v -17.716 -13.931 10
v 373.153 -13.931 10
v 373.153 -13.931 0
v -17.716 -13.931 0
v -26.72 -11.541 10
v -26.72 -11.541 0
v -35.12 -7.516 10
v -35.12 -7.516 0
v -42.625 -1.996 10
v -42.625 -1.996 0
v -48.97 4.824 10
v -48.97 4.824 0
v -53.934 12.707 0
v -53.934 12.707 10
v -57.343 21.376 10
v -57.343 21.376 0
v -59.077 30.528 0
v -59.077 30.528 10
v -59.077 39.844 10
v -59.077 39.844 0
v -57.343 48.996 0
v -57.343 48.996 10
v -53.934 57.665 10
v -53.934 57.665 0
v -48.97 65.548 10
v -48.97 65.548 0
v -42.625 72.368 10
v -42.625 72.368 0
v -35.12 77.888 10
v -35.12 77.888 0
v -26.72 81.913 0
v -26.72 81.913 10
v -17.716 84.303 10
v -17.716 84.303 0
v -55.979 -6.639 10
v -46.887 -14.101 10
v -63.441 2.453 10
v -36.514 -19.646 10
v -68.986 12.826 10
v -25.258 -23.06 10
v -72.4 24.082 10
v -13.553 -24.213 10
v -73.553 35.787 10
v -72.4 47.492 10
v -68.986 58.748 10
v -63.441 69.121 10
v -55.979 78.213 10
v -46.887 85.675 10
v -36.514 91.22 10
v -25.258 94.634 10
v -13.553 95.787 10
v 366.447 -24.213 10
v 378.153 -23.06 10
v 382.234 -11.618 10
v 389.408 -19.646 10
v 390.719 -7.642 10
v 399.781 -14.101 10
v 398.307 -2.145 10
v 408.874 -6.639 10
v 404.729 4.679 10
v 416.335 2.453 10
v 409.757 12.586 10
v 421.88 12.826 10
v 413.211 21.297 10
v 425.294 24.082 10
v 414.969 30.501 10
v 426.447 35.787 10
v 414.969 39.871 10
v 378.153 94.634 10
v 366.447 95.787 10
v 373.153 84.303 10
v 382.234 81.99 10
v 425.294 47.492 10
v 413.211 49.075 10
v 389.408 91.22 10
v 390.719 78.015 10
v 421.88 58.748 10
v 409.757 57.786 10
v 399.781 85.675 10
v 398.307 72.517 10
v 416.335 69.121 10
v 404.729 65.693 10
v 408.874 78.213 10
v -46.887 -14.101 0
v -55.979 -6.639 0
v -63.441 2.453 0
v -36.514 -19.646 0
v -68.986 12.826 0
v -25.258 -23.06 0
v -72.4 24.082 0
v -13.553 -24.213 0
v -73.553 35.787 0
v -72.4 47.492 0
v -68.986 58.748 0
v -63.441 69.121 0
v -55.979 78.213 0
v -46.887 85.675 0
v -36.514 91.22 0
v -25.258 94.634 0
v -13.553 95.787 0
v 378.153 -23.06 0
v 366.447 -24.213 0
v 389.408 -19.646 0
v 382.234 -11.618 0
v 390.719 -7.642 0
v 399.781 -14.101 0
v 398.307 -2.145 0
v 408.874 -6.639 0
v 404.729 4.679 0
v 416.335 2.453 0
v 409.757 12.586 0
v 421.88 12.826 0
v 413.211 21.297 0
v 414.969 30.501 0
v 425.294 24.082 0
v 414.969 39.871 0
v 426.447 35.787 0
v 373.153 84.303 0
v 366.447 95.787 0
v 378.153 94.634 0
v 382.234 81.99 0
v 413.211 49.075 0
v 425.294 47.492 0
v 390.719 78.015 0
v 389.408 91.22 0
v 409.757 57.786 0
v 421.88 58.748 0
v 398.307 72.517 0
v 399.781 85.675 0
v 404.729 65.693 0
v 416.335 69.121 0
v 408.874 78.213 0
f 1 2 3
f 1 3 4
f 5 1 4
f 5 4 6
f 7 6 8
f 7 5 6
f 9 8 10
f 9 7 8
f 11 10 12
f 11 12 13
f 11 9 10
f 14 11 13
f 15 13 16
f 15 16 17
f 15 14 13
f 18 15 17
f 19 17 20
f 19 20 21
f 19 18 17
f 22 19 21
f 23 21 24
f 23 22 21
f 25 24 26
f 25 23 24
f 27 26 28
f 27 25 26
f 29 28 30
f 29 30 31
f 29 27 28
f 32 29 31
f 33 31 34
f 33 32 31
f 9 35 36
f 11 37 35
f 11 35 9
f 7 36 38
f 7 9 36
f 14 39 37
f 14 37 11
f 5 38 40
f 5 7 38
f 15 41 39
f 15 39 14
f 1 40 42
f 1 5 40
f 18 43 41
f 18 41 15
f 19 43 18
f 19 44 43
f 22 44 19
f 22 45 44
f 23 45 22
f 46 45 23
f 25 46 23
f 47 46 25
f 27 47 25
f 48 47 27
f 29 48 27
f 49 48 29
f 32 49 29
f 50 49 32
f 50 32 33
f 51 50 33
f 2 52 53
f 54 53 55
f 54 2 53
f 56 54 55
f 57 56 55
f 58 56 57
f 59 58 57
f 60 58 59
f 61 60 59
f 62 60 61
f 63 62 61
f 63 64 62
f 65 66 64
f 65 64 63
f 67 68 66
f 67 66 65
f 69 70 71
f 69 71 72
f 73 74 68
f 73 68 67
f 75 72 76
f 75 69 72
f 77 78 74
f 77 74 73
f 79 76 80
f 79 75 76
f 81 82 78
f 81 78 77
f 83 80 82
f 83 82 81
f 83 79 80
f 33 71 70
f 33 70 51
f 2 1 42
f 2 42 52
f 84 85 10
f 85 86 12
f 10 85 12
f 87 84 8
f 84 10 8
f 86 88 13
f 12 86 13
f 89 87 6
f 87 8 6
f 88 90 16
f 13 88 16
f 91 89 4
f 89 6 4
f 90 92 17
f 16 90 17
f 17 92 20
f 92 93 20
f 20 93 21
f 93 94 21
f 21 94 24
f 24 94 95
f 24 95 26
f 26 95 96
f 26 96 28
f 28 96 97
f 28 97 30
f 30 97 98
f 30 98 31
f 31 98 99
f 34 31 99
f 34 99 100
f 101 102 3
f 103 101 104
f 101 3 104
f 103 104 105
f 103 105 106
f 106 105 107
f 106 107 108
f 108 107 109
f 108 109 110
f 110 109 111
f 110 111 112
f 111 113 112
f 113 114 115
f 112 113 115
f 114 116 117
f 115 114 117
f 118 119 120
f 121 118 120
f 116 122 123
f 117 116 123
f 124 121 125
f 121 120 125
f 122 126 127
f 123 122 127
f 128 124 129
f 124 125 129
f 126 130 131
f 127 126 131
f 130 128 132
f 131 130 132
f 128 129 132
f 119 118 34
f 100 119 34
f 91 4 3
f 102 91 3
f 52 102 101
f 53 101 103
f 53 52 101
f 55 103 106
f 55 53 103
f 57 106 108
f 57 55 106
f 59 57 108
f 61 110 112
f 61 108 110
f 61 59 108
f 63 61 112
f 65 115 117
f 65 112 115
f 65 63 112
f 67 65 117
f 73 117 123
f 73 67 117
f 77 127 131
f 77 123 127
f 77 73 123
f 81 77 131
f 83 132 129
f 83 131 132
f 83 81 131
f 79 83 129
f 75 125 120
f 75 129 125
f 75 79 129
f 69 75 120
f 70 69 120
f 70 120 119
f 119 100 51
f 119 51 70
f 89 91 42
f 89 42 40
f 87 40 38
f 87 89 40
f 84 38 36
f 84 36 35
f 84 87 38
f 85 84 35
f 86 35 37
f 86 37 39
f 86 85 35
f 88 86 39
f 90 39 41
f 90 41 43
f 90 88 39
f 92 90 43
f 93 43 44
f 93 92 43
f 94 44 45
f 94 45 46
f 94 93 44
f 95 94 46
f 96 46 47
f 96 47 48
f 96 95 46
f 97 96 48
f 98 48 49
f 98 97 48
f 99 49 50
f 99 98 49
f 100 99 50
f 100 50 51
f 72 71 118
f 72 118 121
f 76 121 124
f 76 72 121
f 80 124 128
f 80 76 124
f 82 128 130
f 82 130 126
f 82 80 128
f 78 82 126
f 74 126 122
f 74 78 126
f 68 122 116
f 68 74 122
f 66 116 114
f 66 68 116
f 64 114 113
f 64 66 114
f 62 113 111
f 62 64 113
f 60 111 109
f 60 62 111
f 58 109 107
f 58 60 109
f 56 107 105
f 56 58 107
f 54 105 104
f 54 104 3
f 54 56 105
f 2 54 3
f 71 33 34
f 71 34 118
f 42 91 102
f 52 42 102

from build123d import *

# Parameters (mm, degrees)
SKETCH_1_W          = 500
SKETCH_1_H          = 120
EXTRUDE_1_DEPTH     = 10
FILLET_8_RADIUS     = 60
FILLET_8_LENGTH     = 10
FILLET_9_RADIUS     = 60
FILLET_9_LENGTH     = 10
CUT_EXTRUDE_1_DEPTH = 10


with BuildPart() as part:
    # 草图1 → 凸台-拉伸1 (new body)
    with BuildSketch(Plane.XY):
        with Locations((176.447257932, 35.78698553)):
            Rectangle(SKETCH_1_W, SKETCH_1_H)
    extrude(amount=EXTRUDE_1_DEPTH)

    # 圆角8: full round fillet: the end face becomes a half cylinder, R = half its width
    fillet_8_face = Plane((-73.552742068, 35.78698553, 5), x_dir=(0, 0, -1), z_dir=(-1, 0, 0))  # on the end face: x along it, z out of the body
    fillet_8_slab = fillet_8_face.offset(-FILLET_8_RADIUS / 2) * Box(FILLET_8_LENGTH, 2 * FILLET_8_RADIUS, FILLET_8_RADIUS, mode=Mode.PRIVATE)  # the body's end, R deep
    fillet_8_round = Plane((-13.552742068, 35.78698553, 5), x_dir=(-1, 0, 0), z_dir=(0, 0, -1)) * Cylinder(FILLET_8_RADIUS, FILLET_8_LENGTH, mode=Mode.PRIVATE)  # its axis R under the face
    add(fillet_8_slab - fillet_8_round, mode=Mode.SUBTRACT)

    # 圆角9: full round fillet: the end face becomes a half cylinder, R = half its width
    fillet_9_face = Plane((426.447257932, 35.78698553, 5), x_dir=(0, 0, 1), z_dir=(1, 0, 0))  # on the end face: x along it, z out of the body
    fillet_9_slab = fillet_9_face.offset(-FILLET_9_RADIUS / 2) * Box(FILLET_9_LENGTH, 2 * FILLET_9_RADIUS, FILLET_9_RADIUS, mode=Mode.PRIVATE)  # the body's end, R deep
    fillet_9_round = Plane((366.447257932, 35.78698553, 5), x_dir=(1, 0, 0), z_dir=(0, 0, 1)) * Cylinder(FILLET_9_RADIUS, FILLET_9_LENGTH, mode=Mode.PRIVATE)  # its axis R under the face
    add(fillet_9_slab - fillet_9_round, mode=Mode.SUBTRACT)

    # 草图4 → 切除-拉伸1 (cut)
    with BuildSketch(Plane.XY.offset(10)):
        with BuildLine():
            Line((-17.715997056, 84.303216301), (373.153004855, 84.303216301))
            ThreePointArc((373.153004855, 84.303216301), (415.190496712, 35.186079817), (373.153004855, -13.931056666))
            Line((373.153004855, -13.931056666), (-17.715997056, -13.931056666))
            ThreePointArc((-17.715997056, -13.931056666), (-59.295663847, 35.186079817), (-17.715997056, 84.303216301))
        make_face()
    extrude(amount=-CUT_EXTRUDE_1_DEPTH, mode=Mode.SUBTRACT)


solid = part.part
